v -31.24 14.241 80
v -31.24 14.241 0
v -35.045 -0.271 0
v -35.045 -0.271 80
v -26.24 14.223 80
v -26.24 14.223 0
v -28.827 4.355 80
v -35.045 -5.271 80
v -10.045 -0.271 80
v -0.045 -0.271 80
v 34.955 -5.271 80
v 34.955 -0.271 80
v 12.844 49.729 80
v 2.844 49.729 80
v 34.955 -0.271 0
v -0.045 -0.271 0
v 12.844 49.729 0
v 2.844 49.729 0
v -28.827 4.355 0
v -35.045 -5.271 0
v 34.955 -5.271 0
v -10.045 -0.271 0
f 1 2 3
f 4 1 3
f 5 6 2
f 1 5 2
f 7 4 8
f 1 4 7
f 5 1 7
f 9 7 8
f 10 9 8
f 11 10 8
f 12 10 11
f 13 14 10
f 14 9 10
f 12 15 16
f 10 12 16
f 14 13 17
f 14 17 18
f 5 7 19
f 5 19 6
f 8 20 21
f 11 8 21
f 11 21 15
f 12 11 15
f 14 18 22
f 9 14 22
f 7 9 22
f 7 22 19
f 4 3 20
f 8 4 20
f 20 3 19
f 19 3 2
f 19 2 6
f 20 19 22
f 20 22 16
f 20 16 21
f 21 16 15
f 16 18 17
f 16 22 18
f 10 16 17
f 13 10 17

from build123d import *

# Parameters (mm, degrees)
EXTRUDE_4_DEPTH = 80


with BuildPart() as part:
    # 草圖1 → 填料-伸長4 (new body)
    with BuildSketch(Plane.XY):
        Polygon((-0.045443236, -0.270925117), (-10.045443236, -0.270925117), (-35.045443236, -0.270925117), (-35.045443236, -5.270925117), (34.954556764, -5.270925117), (34.954556764, -0.270925117), align=None)
        Polygon((2.843781018, 49.729074883), (-10.045443236, -0.270925117), (-0.045443236, -0.270925117), (12.843781018, 49.729074883), align=None)
        Polygon((-35.045443236, -0.270925117), (-10.045443236, -0.270925117), (-28.827398823, 4.355440349), (-26.239696609, 14.22289864), (-31.239662656, 14.241324755), align=None)
    extrude(amount=EXTRUDE_4_DEPTH)


solid = part.part
